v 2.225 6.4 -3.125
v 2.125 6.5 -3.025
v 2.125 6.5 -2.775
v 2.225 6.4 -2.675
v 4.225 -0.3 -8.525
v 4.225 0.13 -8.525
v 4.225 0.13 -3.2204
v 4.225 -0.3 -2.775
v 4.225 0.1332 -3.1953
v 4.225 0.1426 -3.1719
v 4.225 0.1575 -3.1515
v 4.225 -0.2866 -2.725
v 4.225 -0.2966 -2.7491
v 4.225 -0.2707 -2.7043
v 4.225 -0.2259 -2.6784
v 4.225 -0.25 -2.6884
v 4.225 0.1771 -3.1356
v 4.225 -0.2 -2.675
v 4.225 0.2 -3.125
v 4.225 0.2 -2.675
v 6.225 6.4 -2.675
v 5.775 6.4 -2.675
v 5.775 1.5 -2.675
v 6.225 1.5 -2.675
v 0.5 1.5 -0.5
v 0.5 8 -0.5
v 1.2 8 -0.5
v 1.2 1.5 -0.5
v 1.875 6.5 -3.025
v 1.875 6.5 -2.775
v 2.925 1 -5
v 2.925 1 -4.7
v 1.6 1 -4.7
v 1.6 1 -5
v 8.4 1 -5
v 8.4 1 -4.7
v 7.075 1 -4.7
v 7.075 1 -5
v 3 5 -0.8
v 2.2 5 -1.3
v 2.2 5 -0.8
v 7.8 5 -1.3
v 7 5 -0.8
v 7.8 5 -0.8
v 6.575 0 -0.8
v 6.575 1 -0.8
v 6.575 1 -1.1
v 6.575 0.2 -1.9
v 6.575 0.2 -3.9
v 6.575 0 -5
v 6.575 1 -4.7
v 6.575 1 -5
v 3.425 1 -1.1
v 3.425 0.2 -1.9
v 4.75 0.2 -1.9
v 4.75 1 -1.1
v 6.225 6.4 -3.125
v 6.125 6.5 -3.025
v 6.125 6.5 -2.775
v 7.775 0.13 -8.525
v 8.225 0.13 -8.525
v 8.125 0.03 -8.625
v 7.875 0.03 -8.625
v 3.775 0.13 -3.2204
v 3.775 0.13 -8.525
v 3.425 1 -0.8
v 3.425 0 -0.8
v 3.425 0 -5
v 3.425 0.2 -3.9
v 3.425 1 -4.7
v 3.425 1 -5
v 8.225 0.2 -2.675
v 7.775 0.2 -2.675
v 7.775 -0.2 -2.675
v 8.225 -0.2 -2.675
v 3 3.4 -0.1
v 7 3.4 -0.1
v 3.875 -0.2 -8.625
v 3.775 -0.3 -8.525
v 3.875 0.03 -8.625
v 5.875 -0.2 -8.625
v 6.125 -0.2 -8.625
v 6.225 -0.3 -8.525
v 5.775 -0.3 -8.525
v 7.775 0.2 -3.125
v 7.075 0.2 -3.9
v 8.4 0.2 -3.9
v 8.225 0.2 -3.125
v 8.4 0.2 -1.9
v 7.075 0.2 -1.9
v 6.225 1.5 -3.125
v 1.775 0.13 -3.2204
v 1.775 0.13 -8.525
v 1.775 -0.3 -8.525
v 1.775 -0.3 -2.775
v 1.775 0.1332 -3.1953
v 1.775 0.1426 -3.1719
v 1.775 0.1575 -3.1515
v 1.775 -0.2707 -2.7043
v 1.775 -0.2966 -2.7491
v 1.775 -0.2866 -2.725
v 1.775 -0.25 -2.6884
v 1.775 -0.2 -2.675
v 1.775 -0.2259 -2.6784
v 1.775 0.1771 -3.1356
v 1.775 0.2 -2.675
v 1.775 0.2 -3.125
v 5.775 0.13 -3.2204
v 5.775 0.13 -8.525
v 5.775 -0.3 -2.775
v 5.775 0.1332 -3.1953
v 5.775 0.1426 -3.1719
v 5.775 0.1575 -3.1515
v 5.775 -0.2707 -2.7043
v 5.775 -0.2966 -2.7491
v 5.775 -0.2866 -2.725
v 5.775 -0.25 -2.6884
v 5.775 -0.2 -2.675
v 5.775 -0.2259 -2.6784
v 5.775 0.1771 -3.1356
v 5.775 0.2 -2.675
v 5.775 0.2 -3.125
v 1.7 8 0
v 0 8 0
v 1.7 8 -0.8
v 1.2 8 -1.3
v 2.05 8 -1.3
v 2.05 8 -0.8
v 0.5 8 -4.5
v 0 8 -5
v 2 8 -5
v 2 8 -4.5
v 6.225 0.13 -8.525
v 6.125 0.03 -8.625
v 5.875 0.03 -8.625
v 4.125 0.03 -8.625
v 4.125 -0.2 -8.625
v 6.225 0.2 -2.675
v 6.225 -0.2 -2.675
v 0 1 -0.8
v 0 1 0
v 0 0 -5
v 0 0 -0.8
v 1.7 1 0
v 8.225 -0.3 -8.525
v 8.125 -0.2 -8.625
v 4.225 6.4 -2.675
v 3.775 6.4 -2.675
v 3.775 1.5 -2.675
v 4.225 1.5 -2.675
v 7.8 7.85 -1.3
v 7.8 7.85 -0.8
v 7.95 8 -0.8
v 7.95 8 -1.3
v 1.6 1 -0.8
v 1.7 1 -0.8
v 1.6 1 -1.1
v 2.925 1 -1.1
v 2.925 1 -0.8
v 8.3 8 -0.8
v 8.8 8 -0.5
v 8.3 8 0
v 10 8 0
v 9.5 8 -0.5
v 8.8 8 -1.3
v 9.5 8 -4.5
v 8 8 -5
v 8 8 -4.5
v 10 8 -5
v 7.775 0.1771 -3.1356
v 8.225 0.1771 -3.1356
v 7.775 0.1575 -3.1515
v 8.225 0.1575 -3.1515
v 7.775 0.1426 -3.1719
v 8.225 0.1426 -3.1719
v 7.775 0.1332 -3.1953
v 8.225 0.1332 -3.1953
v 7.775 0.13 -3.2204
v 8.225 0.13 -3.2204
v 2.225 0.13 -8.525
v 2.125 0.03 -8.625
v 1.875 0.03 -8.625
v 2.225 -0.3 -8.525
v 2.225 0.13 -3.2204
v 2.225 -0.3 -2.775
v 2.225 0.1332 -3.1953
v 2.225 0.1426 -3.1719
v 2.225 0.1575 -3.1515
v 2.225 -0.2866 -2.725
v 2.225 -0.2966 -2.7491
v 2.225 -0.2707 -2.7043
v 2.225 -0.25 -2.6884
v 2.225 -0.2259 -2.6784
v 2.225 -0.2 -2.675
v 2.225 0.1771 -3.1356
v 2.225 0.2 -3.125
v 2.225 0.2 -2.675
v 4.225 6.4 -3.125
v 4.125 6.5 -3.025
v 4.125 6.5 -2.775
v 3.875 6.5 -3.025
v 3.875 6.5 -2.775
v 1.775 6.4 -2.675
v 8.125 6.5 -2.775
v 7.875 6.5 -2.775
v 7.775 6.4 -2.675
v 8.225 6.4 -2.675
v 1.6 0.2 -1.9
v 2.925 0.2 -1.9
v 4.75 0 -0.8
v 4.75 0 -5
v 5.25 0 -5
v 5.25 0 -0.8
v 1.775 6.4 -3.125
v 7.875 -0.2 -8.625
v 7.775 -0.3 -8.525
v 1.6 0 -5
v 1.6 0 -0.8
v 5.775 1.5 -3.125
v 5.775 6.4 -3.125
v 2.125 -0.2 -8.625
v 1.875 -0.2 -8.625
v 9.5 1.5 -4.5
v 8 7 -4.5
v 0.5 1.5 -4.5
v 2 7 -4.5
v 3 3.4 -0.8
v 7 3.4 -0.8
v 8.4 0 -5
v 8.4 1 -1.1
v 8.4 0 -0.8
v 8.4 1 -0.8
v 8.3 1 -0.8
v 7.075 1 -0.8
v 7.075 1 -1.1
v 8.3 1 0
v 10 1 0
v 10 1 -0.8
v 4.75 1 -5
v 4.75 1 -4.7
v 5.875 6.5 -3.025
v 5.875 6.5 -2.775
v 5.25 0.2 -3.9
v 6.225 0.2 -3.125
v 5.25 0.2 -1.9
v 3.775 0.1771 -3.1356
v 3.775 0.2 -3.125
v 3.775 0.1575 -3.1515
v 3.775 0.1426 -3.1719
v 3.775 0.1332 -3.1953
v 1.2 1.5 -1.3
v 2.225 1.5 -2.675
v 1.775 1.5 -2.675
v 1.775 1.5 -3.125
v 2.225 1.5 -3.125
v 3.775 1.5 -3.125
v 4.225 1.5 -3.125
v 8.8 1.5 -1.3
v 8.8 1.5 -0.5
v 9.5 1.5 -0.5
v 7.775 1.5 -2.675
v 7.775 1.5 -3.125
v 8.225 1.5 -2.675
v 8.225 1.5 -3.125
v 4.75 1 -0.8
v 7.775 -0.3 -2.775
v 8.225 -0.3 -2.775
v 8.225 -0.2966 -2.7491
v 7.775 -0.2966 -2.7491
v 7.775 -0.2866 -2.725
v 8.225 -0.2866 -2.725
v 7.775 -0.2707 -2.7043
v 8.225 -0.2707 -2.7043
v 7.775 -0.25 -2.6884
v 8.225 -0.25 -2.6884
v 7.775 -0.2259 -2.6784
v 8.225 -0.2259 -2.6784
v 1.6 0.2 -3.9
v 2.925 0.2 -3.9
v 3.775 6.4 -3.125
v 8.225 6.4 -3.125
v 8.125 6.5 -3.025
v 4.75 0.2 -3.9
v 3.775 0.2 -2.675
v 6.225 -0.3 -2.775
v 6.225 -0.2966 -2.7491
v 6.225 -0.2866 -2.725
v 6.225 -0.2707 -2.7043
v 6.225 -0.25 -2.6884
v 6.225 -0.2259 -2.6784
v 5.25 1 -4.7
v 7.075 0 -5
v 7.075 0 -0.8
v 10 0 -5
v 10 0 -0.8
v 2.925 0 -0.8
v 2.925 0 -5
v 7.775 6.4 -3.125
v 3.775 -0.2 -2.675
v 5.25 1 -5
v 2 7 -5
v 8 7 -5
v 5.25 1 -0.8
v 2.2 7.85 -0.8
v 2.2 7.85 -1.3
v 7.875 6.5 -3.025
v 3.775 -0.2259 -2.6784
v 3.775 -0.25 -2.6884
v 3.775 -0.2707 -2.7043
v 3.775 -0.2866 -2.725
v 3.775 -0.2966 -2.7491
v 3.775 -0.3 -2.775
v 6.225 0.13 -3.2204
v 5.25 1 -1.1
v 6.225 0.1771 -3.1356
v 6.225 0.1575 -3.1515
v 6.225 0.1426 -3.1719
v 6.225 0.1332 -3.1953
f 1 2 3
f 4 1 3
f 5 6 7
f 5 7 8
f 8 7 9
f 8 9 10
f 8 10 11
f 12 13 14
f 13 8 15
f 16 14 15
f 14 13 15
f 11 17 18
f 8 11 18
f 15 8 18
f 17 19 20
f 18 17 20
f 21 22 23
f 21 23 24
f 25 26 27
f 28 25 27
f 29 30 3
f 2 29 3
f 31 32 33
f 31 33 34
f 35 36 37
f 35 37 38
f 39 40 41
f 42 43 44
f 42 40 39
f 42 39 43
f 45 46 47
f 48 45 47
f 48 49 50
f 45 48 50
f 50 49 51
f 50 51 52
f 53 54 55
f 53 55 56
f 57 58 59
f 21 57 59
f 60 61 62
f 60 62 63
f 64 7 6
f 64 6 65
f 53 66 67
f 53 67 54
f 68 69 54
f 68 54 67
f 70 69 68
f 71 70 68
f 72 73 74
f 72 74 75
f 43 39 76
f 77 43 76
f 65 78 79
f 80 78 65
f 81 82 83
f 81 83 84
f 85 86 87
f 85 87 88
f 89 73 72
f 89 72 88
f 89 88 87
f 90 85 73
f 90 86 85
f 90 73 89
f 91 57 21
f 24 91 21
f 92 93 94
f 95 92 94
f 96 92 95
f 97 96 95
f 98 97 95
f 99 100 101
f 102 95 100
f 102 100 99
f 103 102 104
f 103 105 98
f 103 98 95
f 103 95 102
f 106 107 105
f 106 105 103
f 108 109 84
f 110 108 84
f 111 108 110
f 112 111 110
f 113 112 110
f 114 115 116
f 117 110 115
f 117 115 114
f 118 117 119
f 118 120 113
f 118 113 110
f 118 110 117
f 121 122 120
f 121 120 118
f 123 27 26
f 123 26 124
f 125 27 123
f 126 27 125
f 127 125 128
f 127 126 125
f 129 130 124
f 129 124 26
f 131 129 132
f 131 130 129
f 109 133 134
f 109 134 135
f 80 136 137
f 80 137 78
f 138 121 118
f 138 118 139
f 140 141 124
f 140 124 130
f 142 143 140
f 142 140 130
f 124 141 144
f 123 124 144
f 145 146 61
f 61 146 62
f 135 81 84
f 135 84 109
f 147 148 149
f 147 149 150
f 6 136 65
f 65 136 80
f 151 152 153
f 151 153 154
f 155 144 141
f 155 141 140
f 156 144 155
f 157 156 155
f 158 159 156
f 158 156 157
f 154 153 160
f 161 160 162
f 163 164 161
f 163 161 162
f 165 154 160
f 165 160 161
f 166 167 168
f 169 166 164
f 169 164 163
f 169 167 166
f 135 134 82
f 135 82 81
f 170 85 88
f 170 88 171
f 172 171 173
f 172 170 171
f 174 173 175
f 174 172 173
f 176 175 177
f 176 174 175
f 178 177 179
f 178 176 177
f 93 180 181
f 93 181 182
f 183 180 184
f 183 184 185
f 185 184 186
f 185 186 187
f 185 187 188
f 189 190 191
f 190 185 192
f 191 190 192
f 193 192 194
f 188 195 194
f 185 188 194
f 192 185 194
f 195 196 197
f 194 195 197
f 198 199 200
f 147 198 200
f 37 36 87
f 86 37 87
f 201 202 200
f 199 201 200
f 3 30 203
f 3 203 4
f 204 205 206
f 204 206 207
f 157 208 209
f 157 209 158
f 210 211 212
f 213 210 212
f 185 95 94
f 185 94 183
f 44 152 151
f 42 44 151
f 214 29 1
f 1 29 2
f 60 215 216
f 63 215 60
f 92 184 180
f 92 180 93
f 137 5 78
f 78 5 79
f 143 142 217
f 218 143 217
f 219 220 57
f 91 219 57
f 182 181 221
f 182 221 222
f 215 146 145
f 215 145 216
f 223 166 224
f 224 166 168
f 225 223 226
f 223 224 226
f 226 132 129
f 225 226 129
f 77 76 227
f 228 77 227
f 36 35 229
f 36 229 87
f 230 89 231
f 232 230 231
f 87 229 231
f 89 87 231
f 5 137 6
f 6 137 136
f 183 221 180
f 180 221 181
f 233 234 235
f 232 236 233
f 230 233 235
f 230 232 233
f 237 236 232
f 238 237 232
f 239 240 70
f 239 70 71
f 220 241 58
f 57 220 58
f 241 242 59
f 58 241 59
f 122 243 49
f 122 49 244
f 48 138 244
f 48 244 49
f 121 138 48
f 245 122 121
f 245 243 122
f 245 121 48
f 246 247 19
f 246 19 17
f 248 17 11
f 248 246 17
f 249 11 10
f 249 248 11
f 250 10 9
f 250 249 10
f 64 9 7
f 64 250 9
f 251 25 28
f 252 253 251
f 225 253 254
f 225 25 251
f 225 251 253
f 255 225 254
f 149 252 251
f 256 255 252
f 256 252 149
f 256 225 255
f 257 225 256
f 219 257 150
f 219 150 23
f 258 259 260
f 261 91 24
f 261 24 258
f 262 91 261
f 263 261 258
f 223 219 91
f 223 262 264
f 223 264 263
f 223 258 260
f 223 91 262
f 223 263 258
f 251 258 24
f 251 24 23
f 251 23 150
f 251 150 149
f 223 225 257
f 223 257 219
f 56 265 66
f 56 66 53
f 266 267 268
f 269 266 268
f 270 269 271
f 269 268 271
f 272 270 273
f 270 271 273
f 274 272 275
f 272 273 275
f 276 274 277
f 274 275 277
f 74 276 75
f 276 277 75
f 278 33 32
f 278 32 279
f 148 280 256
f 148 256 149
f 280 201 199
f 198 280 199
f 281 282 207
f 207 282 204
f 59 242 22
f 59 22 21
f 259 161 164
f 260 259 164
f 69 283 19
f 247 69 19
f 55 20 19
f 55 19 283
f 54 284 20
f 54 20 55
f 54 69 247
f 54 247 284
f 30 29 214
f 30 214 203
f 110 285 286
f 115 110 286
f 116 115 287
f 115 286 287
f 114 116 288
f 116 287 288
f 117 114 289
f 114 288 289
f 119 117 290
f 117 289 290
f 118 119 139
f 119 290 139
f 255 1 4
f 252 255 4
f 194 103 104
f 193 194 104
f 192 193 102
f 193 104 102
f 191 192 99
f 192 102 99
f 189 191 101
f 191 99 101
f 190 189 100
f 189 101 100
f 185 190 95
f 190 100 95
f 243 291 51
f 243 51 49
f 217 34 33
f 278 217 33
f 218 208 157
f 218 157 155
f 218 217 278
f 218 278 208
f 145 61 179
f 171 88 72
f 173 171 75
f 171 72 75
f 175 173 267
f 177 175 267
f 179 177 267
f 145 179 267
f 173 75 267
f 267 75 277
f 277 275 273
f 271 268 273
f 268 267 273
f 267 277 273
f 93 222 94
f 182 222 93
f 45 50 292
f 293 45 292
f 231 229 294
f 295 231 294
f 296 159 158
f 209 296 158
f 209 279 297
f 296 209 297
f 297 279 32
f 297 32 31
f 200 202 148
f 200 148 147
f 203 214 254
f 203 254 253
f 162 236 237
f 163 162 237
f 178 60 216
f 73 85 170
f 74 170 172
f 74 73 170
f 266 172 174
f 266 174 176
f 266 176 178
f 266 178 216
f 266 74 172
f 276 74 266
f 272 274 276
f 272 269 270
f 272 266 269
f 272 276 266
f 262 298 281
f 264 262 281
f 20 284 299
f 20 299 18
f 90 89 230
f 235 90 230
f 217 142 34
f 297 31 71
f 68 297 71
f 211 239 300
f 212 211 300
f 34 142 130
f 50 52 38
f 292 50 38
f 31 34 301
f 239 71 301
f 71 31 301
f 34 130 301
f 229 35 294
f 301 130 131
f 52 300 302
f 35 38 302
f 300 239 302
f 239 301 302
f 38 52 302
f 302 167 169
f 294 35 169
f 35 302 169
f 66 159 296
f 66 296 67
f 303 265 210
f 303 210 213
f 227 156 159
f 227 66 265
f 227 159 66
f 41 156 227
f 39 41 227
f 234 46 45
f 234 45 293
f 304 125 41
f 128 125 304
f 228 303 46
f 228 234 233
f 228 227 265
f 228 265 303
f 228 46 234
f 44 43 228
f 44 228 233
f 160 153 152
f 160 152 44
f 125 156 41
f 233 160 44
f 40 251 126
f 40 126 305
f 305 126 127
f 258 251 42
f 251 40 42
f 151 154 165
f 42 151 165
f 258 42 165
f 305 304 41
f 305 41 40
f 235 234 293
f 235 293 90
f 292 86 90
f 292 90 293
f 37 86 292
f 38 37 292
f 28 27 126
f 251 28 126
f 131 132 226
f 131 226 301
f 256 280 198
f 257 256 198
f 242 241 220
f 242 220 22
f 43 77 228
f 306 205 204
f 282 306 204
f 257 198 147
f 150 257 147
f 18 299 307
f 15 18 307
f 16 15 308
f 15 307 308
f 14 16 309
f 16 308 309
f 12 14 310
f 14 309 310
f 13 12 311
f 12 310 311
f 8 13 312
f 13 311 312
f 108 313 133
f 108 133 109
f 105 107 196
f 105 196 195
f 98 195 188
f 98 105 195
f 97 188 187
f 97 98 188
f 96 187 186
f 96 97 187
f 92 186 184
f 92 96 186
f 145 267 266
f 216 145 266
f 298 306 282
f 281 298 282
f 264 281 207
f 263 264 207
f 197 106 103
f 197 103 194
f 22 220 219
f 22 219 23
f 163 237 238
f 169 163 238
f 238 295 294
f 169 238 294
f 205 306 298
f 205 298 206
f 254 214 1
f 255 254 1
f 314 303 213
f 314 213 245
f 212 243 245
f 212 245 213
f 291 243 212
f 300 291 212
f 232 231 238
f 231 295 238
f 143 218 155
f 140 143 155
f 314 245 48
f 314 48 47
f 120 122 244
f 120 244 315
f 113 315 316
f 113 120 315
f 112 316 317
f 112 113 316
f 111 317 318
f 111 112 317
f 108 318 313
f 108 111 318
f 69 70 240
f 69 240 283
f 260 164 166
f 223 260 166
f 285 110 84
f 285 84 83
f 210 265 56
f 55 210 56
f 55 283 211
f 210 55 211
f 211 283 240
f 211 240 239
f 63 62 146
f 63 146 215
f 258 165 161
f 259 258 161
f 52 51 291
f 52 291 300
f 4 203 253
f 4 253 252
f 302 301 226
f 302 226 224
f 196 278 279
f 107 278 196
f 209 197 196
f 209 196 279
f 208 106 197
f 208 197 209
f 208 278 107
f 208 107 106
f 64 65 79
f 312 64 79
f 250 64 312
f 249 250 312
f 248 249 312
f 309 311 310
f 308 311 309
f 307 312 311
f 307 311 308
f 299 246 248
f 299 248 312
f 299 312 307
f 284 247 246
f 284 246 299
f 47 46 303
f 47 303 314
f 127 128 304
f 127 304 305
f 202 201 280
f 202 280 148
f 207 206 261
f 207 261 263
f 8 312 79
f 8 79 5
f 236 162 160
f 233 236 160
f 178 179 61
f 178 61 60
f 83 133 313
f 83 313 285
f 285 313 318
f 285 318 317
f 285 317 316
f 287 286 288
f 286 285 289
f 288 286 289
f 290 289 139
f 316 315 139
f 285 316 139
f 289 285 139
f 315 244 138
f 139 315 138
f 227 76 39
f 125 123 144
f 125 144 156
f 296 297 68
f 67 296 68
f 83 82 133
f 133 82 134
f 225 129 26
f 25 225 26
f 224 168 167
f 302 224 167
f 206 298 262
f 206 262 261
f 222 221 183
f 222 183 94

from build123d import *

# Parameters (mm, degrees)
ESQUISSE1_W             = 10
ESQUISSE1_H             = 5
BOSS_EXTRU_1_DEPTH      = 8
ESQUISSE2_W             = 6.6
ESQUISSE2_H             = 0.8
ENL_V_MAT_EXTRU_1_DEPTH = 8
ENL_V_MAT_EXTRU_2_DEPTH = 6.5
ESQUISSE5_W             = 6
ESQUISSE5_H             = 0.5
ENL_V_MAT_EXTRU_3_DEPTH = 1
ESQUISSE6_W             = 5.6
ESQUISSE6_H             = 0.5
ENL_V_MAT_EXTRU_4_DEPTH = 3
ESQUISSE7_W             = 0.8
ESQUISSE7_H             = 1
ENL_V_MAT_EXTRU_5_DEPTH = 10
ESQUISSE8_W             = 6.8
ESQUISSE8_H             = 4.2
ENL_V_MAT_EXTRU_6_DEPTH = 1
BOSS_EXTRU_2_DEPTH      = 6.8
BOSS_EXTRU_3_DEPTH      = 2
BOSS_EXTRU_3_DEPTH_BACK = 2
ESQUISSE12_W            = 0.5
ESQUISSE12_H            = 4.2
BOSS_EXTRU_4_DEPTH      = 1
CHANFREIN1_SIZE         = 0.15
BOSS_EXTRU_5_DEPTH      = 0.5
BOSS_EXTRU_5_DEPTH_BACK = 6.3
ESQUISSE13_W            = 0.45
ESQUISSE13_H            = 0.45
ESQUISSE14_W            = 0.45
ESQUISSE14_H            = 0.43
BOSS_EXTRU_6_DEPTH      = 5.5
CONG_1_R                = 0.1
CHANFREIN2_SIZE         = 0.1


with BuildPart() as part:
    # Esquisse1 → Boss.-Extru.1 (new body)
    with BuildSketch(Plane(origin=(0, 0, 0), x_dir=(1, 0, 0), z_dir=(0, 1, 0))):
        with Locations((5, 2.5)):
            Rectangle(ESQUISSE1_W, ESQUISSE1_H)
    extrude(amount=BOSS_EXTRU_1_DEPTH)

    # Esquisse2 → Enlèv. mat.-Extru.1 (cut)
    with BuildSketch(Plane(origin=(0, 8, 0), x_dir=(1, 0, 0), z_dir=(0, 1, 0))):
        with Locations((5, 0.4)):
            Rectangle(ESQUISSE2_W, ESQUISSE2_H)
    extrude(amount=-ENL_V_MAT_EXTRU_1_DEPTH, mode=Mode.SUBTRACT)

    # Esquisse4 → Enlèv. mat.-Extru.2 (cut)
    with BuildSketch(Plane(origin=(0, 8, 0), x_dir=(1, 0, 0), z_dir=(0, 1, 0))):
        Polygon((0.5, 0.5), (1.2, 0.5), (1.2, 1.3), (8.8, 1.3), (8.8, 0.5), (9.5, 0.5), (9.5, 4.5), (0.5, 4.5), align=None)
    extrude(amount=-ENL_V_MAT_EXTRU_2_DEPTH, mode=Mode.SUBTRACT)

    # Esquisse5 → Enlèv. mat.-Extru.3 (cut)
    with BuildSketch(Plane(origin=(0, 8, 0), x_dir=(1, 0, 0), z_dir=(0, 1, 0))):
        with Locations((5, 4.75)):
            Rectangle(ESQUISSE5_W, ESQUISSE5_H)
    extrude(amount=-ENL_V_MAT_EXTRU_3_DEPTH, mode=Mode.SUBTRACT)

    # Esquisse6 → Enlèv. mat.-Extru.4 (cut)
    with BuildSketch(Plane(origin=(0, 8, 0), x_dir=(1, 0, 0), z_dir=(0, 1, 0))):
        with Locations((5, 1.05)):
            Rectangle(ESQUISSE6_W, ESQUISSE6_H)
    extrude(amount=-ENL_V_MAT_EXTRU_4_DEPTH, mode=Mode.SUBTRACT)

    # Esquisse7 → Enlèv. mat.-Extru.5 (cut)
    with BuildSketch(Plane(origin=(10, 0, 0), x_dir=(0, 0, -1), z_dir=(1, 0, 0))):
        with Locations((0.4, 0.5)):
            Rectangle(ESQUISSE7_W, ESQUISSE7_H)
    extrude(amount=-ENL_V_MAT_EXTRU_5_DEPTH, mode=Mode.SUBTRACT)

    # Esquisse8 → Enlèv. mat.-Extru.6 (cut)
    with BuildSketch(Plane.XZ):
        with Locations((5, -2.9)):
            Rectangle(ESQUISSE8_W, ESQUISSE8_H)
    extrude(amount=-ENL_V_MAT_EXTRU_6_DEPTH, mode=Mode.SUBTRACT)

    # Esquisse9 → Boss.-Extru.2 (add)
    with BuildSketch(Plane(origin=(1.6, 0, 0), x_dir=(0, 0, -1), z_dir=(1, 0, 0))):
        Polygon((4.7, 1), (3.9, 0.2), (1.9, 0.2), (1.1, 1), align=None)
    extrude(amount=BOSS_EXTRU_2_DEPTH)

    # Esquisse11 → Boss.-Extru.3 (add, two sides: drawn at the far end of the back side and taken through both)
    with BuildSketch(Plane(origin=(5, 0, 0), x_dir=(0, 0, -1), z_dir=(1, 0, 0)).offset(-BOSS_EXTRU_3_DEPTH_BACK)):
        Polygon((0.8, 5), (0.1, 3.4), (0.8, 3.4), align=None)
    extrude(amount=BOSS_EXTRU_3_DEPTH + BOSS_EXTRU_3_DEPTH_BACK)

    # Esquisse12 → Boss.-Extru.4 (add)
    with BuildSketch(Plane(origin=(0, 1, 0), x_dir=(1, 0, 0), z_dir=(0, 1, 0))):
        with Locations((5, 2.9)):
            Rectangle(ESQUISSE12_W, ESQUISSE12_H)
        with Locations((3.175, 2.9)):
            Rectangle(ESQUISSE12_W, ESQUISSE12_H)
        with Locations((6.825, 2.9)):
            Rectangle(ESQUISSE12_W, ESQUISSE12_H)
    extrude(amount=-BOSS_EXTRU_4_DEPTH)

    # Chanfrein1
    chanfrein1_edges = [part.edges().sort_by_distance(p)[0] for p in [
        (2.2, 8, -1.05),
        (7.8, 8, -1.05),
    ]]
    chamfer(chanfrein1_edges, length=CHANFREIN1_SIZE)

    # Esquisse13 → Boss.-Extru.5 (add, two sides: drawn at the far end of the back side and taken through both)
    with BuildSketch(Plane.XZ.offset(-0.2).offset(-BOSS_EXTRU_5_DEPTH_BACK)):
        with Locations((4, -2.9)):
            Rectangle(ESQUISSE13_W, ESQUISSE13_H)
        with Locations((2, -2.9)):
            Rectangle(ESQUISSE13_W, ESQUISSE13_H)
        with Locations((8, -2.9)):
            Rectangle(ESQUISSE13_W, ESQUISSE13_H)
        with Locations((6, -2.9)):
            Rectangle(ESQUISSE13_W, ESQUISSE13_H)
    extrude(amount=BOSS_EXTRU_5_DEPTH + BOSS_EXTRU_5_DEPTH_BACK)

    # Esquisse14 → Boss.-Extru.6 (add)
    with BuildSketch(Plane(origin=(0, 0, -3.125), x_dir=(-1, 0, 0), z_dir=(0, 0, -1))):
        with Locations((-8, -0.085)):
            Rectangle(ESQUISSE14_W, ESQUISSE14_H)
        with Locations((-6, -0.085)):
            Rectangle(ESQUISSE14_W, ESQUISSE14_H)
        with Locations((-4, -0.085)):
            Rectangle(ESQUISSE14_W, ESQUISSE14_H)
        with Locations((-2, -0.085)):
            Rectangle(ESQUISSE14_W, ESQUISSE14_H)
    extrude(amount=BOSS_EXTRU_6_DEPTH)

    # Congé1
    # the kernel refuses this fillet: 0.1 mm, written as the material it adds along each edge
    with BuildSketch(Plane(origin=(7.775, 0.13, -3.125), x_dir=(0, 1, 0), z_dir=(1, 0, 0)), Plane(origin=(5.775, 0.13, -3.125), x_dir=(0, 1, 0), z_dir=(1, 0, 0))) as cong_1_piece_1:
        with BuildLine():
            CenterArc((0.1, -0.09539392), CONG_1_R, 107.457603124, 72.542396876)
            Line((0, -0.09539392), (0, 0))
            Line((0, 0), (0.07, 0))
        make_face()
    extrude(amount=0.45)
    with BuildSketch(Plane(origin=(3.775, 0.13, -3.125), x_dir=(0, 0, -1), z_dir=(1, 0, 0)), Plane(origin=(1.775, 0.13, -3.125), x_dir=(0, 0, -1), z_dir=(1, 0, 0))) as cong_1_piece_2:
        with BuildLine():
            CenterArc((0.09539392, 0.1), CONG_1_R, 197.457603124, 72.542396876)
            Line((0, 0.07), (0, 0))
            Line((0, 0), (0.09539392, 0))
        make_face()
    extrude(amount=0.45)
    # the kernel refuses this fillet: 0.1 mm, written as the material it takes off along each edge
    with BuildSketch(Plane(origin=(3.525, -0.3, -2.675), x_dir=(0, 1, 0), z_dir=(1, 0, 0)), Plane(origin=(1.525, -0.3, -2.675), x_dir=(0, 1, 0), z_dir=(1, 0, 0))) as cong_1_2_piece_1:
        with BuildLine():
            CenterArc((CONG_1_R, -CONG_1_R), CONG_1_R, 90, 90)
            Line((0, -CONG_1_R), (0, 0))
            Line((0, 0), (CONG_1_R, 0))
        make_face()
    extrude(amount=0.95, mode=Mode.SUBTRACT)
    with BuildSketch(Plane(origin=(8.475, -0.3, -2.675), x_dir=(0, 1, 0), z_dir=(-1, 0, 0)), Plane(origin=(6.475, -0.3, -2.675), x_dir=(0, 1, 0), z_dir=(-1, 0, 0))) as cong_1_2_piece_2:
        with BuildLine():
            CenterArc((CONG_1_R, CONG_1_R), CONG_1_R, 180, 90)
            Line((0, CONG_1_R), (0, 0))
            Line((0, 0), (CONG_1_R, 0))
        make_face()
    extrude(amount=0.95, mode=Mode.SUBTRACT)

    # Chanfrein2
    chanfrein2_edges = [part.edges().sort_by_distance(p)[0] for p in [
        (4.225, 6.5, -2.9),
        (4, 6.5, -3.125),
        (3.775, 6.5, -2.9),
        (4, 6.5, -2.675),
        (2.225, 6.5, -2.9),
        (2, 6.5, -3.125),
        (1.775, 6.5, -2.9),
        (2, 6.5, -2.675),
        (7.775, 6.5, -2.9),
        (8, 6.5, -2.675),
        (8.225, 6.5, -2.9),
        (8, 6.5, -3.125),
        (5.775, 6.5, -2.9),
        (6, 6.5, -2.675),
        (6.225, 6.5, -2.9),
        (6, 6.5, -3.125),
        (8.225, -0.085, -8.625),
        (8, -0.3, -8.625),
        (7.775, -0.085, -8.625),
        (8, 0.13, -8.625),
        (6.225, -0.085, -8.625),
        (6, -0.3, -8.625),
        (5.775, -0.085, -8.625),
        (6, 0.13, -8.625),
        (4.225, -0.085, -8.625),
        (4, -0.3, -8.625),
        (3.775, -0.085, -8.625),
        (4, 0.13, -8.625),
        (2.225, -0.085, -8.625),
        (2, -0.3, -8.625),
        (1.775, -0.085, -8.625),
        (2, 0.13, -8.625),
    ]]
    chamfer(chanfrein2_edges, length=CHANFREIN2_SIZE)


solid = part.part
